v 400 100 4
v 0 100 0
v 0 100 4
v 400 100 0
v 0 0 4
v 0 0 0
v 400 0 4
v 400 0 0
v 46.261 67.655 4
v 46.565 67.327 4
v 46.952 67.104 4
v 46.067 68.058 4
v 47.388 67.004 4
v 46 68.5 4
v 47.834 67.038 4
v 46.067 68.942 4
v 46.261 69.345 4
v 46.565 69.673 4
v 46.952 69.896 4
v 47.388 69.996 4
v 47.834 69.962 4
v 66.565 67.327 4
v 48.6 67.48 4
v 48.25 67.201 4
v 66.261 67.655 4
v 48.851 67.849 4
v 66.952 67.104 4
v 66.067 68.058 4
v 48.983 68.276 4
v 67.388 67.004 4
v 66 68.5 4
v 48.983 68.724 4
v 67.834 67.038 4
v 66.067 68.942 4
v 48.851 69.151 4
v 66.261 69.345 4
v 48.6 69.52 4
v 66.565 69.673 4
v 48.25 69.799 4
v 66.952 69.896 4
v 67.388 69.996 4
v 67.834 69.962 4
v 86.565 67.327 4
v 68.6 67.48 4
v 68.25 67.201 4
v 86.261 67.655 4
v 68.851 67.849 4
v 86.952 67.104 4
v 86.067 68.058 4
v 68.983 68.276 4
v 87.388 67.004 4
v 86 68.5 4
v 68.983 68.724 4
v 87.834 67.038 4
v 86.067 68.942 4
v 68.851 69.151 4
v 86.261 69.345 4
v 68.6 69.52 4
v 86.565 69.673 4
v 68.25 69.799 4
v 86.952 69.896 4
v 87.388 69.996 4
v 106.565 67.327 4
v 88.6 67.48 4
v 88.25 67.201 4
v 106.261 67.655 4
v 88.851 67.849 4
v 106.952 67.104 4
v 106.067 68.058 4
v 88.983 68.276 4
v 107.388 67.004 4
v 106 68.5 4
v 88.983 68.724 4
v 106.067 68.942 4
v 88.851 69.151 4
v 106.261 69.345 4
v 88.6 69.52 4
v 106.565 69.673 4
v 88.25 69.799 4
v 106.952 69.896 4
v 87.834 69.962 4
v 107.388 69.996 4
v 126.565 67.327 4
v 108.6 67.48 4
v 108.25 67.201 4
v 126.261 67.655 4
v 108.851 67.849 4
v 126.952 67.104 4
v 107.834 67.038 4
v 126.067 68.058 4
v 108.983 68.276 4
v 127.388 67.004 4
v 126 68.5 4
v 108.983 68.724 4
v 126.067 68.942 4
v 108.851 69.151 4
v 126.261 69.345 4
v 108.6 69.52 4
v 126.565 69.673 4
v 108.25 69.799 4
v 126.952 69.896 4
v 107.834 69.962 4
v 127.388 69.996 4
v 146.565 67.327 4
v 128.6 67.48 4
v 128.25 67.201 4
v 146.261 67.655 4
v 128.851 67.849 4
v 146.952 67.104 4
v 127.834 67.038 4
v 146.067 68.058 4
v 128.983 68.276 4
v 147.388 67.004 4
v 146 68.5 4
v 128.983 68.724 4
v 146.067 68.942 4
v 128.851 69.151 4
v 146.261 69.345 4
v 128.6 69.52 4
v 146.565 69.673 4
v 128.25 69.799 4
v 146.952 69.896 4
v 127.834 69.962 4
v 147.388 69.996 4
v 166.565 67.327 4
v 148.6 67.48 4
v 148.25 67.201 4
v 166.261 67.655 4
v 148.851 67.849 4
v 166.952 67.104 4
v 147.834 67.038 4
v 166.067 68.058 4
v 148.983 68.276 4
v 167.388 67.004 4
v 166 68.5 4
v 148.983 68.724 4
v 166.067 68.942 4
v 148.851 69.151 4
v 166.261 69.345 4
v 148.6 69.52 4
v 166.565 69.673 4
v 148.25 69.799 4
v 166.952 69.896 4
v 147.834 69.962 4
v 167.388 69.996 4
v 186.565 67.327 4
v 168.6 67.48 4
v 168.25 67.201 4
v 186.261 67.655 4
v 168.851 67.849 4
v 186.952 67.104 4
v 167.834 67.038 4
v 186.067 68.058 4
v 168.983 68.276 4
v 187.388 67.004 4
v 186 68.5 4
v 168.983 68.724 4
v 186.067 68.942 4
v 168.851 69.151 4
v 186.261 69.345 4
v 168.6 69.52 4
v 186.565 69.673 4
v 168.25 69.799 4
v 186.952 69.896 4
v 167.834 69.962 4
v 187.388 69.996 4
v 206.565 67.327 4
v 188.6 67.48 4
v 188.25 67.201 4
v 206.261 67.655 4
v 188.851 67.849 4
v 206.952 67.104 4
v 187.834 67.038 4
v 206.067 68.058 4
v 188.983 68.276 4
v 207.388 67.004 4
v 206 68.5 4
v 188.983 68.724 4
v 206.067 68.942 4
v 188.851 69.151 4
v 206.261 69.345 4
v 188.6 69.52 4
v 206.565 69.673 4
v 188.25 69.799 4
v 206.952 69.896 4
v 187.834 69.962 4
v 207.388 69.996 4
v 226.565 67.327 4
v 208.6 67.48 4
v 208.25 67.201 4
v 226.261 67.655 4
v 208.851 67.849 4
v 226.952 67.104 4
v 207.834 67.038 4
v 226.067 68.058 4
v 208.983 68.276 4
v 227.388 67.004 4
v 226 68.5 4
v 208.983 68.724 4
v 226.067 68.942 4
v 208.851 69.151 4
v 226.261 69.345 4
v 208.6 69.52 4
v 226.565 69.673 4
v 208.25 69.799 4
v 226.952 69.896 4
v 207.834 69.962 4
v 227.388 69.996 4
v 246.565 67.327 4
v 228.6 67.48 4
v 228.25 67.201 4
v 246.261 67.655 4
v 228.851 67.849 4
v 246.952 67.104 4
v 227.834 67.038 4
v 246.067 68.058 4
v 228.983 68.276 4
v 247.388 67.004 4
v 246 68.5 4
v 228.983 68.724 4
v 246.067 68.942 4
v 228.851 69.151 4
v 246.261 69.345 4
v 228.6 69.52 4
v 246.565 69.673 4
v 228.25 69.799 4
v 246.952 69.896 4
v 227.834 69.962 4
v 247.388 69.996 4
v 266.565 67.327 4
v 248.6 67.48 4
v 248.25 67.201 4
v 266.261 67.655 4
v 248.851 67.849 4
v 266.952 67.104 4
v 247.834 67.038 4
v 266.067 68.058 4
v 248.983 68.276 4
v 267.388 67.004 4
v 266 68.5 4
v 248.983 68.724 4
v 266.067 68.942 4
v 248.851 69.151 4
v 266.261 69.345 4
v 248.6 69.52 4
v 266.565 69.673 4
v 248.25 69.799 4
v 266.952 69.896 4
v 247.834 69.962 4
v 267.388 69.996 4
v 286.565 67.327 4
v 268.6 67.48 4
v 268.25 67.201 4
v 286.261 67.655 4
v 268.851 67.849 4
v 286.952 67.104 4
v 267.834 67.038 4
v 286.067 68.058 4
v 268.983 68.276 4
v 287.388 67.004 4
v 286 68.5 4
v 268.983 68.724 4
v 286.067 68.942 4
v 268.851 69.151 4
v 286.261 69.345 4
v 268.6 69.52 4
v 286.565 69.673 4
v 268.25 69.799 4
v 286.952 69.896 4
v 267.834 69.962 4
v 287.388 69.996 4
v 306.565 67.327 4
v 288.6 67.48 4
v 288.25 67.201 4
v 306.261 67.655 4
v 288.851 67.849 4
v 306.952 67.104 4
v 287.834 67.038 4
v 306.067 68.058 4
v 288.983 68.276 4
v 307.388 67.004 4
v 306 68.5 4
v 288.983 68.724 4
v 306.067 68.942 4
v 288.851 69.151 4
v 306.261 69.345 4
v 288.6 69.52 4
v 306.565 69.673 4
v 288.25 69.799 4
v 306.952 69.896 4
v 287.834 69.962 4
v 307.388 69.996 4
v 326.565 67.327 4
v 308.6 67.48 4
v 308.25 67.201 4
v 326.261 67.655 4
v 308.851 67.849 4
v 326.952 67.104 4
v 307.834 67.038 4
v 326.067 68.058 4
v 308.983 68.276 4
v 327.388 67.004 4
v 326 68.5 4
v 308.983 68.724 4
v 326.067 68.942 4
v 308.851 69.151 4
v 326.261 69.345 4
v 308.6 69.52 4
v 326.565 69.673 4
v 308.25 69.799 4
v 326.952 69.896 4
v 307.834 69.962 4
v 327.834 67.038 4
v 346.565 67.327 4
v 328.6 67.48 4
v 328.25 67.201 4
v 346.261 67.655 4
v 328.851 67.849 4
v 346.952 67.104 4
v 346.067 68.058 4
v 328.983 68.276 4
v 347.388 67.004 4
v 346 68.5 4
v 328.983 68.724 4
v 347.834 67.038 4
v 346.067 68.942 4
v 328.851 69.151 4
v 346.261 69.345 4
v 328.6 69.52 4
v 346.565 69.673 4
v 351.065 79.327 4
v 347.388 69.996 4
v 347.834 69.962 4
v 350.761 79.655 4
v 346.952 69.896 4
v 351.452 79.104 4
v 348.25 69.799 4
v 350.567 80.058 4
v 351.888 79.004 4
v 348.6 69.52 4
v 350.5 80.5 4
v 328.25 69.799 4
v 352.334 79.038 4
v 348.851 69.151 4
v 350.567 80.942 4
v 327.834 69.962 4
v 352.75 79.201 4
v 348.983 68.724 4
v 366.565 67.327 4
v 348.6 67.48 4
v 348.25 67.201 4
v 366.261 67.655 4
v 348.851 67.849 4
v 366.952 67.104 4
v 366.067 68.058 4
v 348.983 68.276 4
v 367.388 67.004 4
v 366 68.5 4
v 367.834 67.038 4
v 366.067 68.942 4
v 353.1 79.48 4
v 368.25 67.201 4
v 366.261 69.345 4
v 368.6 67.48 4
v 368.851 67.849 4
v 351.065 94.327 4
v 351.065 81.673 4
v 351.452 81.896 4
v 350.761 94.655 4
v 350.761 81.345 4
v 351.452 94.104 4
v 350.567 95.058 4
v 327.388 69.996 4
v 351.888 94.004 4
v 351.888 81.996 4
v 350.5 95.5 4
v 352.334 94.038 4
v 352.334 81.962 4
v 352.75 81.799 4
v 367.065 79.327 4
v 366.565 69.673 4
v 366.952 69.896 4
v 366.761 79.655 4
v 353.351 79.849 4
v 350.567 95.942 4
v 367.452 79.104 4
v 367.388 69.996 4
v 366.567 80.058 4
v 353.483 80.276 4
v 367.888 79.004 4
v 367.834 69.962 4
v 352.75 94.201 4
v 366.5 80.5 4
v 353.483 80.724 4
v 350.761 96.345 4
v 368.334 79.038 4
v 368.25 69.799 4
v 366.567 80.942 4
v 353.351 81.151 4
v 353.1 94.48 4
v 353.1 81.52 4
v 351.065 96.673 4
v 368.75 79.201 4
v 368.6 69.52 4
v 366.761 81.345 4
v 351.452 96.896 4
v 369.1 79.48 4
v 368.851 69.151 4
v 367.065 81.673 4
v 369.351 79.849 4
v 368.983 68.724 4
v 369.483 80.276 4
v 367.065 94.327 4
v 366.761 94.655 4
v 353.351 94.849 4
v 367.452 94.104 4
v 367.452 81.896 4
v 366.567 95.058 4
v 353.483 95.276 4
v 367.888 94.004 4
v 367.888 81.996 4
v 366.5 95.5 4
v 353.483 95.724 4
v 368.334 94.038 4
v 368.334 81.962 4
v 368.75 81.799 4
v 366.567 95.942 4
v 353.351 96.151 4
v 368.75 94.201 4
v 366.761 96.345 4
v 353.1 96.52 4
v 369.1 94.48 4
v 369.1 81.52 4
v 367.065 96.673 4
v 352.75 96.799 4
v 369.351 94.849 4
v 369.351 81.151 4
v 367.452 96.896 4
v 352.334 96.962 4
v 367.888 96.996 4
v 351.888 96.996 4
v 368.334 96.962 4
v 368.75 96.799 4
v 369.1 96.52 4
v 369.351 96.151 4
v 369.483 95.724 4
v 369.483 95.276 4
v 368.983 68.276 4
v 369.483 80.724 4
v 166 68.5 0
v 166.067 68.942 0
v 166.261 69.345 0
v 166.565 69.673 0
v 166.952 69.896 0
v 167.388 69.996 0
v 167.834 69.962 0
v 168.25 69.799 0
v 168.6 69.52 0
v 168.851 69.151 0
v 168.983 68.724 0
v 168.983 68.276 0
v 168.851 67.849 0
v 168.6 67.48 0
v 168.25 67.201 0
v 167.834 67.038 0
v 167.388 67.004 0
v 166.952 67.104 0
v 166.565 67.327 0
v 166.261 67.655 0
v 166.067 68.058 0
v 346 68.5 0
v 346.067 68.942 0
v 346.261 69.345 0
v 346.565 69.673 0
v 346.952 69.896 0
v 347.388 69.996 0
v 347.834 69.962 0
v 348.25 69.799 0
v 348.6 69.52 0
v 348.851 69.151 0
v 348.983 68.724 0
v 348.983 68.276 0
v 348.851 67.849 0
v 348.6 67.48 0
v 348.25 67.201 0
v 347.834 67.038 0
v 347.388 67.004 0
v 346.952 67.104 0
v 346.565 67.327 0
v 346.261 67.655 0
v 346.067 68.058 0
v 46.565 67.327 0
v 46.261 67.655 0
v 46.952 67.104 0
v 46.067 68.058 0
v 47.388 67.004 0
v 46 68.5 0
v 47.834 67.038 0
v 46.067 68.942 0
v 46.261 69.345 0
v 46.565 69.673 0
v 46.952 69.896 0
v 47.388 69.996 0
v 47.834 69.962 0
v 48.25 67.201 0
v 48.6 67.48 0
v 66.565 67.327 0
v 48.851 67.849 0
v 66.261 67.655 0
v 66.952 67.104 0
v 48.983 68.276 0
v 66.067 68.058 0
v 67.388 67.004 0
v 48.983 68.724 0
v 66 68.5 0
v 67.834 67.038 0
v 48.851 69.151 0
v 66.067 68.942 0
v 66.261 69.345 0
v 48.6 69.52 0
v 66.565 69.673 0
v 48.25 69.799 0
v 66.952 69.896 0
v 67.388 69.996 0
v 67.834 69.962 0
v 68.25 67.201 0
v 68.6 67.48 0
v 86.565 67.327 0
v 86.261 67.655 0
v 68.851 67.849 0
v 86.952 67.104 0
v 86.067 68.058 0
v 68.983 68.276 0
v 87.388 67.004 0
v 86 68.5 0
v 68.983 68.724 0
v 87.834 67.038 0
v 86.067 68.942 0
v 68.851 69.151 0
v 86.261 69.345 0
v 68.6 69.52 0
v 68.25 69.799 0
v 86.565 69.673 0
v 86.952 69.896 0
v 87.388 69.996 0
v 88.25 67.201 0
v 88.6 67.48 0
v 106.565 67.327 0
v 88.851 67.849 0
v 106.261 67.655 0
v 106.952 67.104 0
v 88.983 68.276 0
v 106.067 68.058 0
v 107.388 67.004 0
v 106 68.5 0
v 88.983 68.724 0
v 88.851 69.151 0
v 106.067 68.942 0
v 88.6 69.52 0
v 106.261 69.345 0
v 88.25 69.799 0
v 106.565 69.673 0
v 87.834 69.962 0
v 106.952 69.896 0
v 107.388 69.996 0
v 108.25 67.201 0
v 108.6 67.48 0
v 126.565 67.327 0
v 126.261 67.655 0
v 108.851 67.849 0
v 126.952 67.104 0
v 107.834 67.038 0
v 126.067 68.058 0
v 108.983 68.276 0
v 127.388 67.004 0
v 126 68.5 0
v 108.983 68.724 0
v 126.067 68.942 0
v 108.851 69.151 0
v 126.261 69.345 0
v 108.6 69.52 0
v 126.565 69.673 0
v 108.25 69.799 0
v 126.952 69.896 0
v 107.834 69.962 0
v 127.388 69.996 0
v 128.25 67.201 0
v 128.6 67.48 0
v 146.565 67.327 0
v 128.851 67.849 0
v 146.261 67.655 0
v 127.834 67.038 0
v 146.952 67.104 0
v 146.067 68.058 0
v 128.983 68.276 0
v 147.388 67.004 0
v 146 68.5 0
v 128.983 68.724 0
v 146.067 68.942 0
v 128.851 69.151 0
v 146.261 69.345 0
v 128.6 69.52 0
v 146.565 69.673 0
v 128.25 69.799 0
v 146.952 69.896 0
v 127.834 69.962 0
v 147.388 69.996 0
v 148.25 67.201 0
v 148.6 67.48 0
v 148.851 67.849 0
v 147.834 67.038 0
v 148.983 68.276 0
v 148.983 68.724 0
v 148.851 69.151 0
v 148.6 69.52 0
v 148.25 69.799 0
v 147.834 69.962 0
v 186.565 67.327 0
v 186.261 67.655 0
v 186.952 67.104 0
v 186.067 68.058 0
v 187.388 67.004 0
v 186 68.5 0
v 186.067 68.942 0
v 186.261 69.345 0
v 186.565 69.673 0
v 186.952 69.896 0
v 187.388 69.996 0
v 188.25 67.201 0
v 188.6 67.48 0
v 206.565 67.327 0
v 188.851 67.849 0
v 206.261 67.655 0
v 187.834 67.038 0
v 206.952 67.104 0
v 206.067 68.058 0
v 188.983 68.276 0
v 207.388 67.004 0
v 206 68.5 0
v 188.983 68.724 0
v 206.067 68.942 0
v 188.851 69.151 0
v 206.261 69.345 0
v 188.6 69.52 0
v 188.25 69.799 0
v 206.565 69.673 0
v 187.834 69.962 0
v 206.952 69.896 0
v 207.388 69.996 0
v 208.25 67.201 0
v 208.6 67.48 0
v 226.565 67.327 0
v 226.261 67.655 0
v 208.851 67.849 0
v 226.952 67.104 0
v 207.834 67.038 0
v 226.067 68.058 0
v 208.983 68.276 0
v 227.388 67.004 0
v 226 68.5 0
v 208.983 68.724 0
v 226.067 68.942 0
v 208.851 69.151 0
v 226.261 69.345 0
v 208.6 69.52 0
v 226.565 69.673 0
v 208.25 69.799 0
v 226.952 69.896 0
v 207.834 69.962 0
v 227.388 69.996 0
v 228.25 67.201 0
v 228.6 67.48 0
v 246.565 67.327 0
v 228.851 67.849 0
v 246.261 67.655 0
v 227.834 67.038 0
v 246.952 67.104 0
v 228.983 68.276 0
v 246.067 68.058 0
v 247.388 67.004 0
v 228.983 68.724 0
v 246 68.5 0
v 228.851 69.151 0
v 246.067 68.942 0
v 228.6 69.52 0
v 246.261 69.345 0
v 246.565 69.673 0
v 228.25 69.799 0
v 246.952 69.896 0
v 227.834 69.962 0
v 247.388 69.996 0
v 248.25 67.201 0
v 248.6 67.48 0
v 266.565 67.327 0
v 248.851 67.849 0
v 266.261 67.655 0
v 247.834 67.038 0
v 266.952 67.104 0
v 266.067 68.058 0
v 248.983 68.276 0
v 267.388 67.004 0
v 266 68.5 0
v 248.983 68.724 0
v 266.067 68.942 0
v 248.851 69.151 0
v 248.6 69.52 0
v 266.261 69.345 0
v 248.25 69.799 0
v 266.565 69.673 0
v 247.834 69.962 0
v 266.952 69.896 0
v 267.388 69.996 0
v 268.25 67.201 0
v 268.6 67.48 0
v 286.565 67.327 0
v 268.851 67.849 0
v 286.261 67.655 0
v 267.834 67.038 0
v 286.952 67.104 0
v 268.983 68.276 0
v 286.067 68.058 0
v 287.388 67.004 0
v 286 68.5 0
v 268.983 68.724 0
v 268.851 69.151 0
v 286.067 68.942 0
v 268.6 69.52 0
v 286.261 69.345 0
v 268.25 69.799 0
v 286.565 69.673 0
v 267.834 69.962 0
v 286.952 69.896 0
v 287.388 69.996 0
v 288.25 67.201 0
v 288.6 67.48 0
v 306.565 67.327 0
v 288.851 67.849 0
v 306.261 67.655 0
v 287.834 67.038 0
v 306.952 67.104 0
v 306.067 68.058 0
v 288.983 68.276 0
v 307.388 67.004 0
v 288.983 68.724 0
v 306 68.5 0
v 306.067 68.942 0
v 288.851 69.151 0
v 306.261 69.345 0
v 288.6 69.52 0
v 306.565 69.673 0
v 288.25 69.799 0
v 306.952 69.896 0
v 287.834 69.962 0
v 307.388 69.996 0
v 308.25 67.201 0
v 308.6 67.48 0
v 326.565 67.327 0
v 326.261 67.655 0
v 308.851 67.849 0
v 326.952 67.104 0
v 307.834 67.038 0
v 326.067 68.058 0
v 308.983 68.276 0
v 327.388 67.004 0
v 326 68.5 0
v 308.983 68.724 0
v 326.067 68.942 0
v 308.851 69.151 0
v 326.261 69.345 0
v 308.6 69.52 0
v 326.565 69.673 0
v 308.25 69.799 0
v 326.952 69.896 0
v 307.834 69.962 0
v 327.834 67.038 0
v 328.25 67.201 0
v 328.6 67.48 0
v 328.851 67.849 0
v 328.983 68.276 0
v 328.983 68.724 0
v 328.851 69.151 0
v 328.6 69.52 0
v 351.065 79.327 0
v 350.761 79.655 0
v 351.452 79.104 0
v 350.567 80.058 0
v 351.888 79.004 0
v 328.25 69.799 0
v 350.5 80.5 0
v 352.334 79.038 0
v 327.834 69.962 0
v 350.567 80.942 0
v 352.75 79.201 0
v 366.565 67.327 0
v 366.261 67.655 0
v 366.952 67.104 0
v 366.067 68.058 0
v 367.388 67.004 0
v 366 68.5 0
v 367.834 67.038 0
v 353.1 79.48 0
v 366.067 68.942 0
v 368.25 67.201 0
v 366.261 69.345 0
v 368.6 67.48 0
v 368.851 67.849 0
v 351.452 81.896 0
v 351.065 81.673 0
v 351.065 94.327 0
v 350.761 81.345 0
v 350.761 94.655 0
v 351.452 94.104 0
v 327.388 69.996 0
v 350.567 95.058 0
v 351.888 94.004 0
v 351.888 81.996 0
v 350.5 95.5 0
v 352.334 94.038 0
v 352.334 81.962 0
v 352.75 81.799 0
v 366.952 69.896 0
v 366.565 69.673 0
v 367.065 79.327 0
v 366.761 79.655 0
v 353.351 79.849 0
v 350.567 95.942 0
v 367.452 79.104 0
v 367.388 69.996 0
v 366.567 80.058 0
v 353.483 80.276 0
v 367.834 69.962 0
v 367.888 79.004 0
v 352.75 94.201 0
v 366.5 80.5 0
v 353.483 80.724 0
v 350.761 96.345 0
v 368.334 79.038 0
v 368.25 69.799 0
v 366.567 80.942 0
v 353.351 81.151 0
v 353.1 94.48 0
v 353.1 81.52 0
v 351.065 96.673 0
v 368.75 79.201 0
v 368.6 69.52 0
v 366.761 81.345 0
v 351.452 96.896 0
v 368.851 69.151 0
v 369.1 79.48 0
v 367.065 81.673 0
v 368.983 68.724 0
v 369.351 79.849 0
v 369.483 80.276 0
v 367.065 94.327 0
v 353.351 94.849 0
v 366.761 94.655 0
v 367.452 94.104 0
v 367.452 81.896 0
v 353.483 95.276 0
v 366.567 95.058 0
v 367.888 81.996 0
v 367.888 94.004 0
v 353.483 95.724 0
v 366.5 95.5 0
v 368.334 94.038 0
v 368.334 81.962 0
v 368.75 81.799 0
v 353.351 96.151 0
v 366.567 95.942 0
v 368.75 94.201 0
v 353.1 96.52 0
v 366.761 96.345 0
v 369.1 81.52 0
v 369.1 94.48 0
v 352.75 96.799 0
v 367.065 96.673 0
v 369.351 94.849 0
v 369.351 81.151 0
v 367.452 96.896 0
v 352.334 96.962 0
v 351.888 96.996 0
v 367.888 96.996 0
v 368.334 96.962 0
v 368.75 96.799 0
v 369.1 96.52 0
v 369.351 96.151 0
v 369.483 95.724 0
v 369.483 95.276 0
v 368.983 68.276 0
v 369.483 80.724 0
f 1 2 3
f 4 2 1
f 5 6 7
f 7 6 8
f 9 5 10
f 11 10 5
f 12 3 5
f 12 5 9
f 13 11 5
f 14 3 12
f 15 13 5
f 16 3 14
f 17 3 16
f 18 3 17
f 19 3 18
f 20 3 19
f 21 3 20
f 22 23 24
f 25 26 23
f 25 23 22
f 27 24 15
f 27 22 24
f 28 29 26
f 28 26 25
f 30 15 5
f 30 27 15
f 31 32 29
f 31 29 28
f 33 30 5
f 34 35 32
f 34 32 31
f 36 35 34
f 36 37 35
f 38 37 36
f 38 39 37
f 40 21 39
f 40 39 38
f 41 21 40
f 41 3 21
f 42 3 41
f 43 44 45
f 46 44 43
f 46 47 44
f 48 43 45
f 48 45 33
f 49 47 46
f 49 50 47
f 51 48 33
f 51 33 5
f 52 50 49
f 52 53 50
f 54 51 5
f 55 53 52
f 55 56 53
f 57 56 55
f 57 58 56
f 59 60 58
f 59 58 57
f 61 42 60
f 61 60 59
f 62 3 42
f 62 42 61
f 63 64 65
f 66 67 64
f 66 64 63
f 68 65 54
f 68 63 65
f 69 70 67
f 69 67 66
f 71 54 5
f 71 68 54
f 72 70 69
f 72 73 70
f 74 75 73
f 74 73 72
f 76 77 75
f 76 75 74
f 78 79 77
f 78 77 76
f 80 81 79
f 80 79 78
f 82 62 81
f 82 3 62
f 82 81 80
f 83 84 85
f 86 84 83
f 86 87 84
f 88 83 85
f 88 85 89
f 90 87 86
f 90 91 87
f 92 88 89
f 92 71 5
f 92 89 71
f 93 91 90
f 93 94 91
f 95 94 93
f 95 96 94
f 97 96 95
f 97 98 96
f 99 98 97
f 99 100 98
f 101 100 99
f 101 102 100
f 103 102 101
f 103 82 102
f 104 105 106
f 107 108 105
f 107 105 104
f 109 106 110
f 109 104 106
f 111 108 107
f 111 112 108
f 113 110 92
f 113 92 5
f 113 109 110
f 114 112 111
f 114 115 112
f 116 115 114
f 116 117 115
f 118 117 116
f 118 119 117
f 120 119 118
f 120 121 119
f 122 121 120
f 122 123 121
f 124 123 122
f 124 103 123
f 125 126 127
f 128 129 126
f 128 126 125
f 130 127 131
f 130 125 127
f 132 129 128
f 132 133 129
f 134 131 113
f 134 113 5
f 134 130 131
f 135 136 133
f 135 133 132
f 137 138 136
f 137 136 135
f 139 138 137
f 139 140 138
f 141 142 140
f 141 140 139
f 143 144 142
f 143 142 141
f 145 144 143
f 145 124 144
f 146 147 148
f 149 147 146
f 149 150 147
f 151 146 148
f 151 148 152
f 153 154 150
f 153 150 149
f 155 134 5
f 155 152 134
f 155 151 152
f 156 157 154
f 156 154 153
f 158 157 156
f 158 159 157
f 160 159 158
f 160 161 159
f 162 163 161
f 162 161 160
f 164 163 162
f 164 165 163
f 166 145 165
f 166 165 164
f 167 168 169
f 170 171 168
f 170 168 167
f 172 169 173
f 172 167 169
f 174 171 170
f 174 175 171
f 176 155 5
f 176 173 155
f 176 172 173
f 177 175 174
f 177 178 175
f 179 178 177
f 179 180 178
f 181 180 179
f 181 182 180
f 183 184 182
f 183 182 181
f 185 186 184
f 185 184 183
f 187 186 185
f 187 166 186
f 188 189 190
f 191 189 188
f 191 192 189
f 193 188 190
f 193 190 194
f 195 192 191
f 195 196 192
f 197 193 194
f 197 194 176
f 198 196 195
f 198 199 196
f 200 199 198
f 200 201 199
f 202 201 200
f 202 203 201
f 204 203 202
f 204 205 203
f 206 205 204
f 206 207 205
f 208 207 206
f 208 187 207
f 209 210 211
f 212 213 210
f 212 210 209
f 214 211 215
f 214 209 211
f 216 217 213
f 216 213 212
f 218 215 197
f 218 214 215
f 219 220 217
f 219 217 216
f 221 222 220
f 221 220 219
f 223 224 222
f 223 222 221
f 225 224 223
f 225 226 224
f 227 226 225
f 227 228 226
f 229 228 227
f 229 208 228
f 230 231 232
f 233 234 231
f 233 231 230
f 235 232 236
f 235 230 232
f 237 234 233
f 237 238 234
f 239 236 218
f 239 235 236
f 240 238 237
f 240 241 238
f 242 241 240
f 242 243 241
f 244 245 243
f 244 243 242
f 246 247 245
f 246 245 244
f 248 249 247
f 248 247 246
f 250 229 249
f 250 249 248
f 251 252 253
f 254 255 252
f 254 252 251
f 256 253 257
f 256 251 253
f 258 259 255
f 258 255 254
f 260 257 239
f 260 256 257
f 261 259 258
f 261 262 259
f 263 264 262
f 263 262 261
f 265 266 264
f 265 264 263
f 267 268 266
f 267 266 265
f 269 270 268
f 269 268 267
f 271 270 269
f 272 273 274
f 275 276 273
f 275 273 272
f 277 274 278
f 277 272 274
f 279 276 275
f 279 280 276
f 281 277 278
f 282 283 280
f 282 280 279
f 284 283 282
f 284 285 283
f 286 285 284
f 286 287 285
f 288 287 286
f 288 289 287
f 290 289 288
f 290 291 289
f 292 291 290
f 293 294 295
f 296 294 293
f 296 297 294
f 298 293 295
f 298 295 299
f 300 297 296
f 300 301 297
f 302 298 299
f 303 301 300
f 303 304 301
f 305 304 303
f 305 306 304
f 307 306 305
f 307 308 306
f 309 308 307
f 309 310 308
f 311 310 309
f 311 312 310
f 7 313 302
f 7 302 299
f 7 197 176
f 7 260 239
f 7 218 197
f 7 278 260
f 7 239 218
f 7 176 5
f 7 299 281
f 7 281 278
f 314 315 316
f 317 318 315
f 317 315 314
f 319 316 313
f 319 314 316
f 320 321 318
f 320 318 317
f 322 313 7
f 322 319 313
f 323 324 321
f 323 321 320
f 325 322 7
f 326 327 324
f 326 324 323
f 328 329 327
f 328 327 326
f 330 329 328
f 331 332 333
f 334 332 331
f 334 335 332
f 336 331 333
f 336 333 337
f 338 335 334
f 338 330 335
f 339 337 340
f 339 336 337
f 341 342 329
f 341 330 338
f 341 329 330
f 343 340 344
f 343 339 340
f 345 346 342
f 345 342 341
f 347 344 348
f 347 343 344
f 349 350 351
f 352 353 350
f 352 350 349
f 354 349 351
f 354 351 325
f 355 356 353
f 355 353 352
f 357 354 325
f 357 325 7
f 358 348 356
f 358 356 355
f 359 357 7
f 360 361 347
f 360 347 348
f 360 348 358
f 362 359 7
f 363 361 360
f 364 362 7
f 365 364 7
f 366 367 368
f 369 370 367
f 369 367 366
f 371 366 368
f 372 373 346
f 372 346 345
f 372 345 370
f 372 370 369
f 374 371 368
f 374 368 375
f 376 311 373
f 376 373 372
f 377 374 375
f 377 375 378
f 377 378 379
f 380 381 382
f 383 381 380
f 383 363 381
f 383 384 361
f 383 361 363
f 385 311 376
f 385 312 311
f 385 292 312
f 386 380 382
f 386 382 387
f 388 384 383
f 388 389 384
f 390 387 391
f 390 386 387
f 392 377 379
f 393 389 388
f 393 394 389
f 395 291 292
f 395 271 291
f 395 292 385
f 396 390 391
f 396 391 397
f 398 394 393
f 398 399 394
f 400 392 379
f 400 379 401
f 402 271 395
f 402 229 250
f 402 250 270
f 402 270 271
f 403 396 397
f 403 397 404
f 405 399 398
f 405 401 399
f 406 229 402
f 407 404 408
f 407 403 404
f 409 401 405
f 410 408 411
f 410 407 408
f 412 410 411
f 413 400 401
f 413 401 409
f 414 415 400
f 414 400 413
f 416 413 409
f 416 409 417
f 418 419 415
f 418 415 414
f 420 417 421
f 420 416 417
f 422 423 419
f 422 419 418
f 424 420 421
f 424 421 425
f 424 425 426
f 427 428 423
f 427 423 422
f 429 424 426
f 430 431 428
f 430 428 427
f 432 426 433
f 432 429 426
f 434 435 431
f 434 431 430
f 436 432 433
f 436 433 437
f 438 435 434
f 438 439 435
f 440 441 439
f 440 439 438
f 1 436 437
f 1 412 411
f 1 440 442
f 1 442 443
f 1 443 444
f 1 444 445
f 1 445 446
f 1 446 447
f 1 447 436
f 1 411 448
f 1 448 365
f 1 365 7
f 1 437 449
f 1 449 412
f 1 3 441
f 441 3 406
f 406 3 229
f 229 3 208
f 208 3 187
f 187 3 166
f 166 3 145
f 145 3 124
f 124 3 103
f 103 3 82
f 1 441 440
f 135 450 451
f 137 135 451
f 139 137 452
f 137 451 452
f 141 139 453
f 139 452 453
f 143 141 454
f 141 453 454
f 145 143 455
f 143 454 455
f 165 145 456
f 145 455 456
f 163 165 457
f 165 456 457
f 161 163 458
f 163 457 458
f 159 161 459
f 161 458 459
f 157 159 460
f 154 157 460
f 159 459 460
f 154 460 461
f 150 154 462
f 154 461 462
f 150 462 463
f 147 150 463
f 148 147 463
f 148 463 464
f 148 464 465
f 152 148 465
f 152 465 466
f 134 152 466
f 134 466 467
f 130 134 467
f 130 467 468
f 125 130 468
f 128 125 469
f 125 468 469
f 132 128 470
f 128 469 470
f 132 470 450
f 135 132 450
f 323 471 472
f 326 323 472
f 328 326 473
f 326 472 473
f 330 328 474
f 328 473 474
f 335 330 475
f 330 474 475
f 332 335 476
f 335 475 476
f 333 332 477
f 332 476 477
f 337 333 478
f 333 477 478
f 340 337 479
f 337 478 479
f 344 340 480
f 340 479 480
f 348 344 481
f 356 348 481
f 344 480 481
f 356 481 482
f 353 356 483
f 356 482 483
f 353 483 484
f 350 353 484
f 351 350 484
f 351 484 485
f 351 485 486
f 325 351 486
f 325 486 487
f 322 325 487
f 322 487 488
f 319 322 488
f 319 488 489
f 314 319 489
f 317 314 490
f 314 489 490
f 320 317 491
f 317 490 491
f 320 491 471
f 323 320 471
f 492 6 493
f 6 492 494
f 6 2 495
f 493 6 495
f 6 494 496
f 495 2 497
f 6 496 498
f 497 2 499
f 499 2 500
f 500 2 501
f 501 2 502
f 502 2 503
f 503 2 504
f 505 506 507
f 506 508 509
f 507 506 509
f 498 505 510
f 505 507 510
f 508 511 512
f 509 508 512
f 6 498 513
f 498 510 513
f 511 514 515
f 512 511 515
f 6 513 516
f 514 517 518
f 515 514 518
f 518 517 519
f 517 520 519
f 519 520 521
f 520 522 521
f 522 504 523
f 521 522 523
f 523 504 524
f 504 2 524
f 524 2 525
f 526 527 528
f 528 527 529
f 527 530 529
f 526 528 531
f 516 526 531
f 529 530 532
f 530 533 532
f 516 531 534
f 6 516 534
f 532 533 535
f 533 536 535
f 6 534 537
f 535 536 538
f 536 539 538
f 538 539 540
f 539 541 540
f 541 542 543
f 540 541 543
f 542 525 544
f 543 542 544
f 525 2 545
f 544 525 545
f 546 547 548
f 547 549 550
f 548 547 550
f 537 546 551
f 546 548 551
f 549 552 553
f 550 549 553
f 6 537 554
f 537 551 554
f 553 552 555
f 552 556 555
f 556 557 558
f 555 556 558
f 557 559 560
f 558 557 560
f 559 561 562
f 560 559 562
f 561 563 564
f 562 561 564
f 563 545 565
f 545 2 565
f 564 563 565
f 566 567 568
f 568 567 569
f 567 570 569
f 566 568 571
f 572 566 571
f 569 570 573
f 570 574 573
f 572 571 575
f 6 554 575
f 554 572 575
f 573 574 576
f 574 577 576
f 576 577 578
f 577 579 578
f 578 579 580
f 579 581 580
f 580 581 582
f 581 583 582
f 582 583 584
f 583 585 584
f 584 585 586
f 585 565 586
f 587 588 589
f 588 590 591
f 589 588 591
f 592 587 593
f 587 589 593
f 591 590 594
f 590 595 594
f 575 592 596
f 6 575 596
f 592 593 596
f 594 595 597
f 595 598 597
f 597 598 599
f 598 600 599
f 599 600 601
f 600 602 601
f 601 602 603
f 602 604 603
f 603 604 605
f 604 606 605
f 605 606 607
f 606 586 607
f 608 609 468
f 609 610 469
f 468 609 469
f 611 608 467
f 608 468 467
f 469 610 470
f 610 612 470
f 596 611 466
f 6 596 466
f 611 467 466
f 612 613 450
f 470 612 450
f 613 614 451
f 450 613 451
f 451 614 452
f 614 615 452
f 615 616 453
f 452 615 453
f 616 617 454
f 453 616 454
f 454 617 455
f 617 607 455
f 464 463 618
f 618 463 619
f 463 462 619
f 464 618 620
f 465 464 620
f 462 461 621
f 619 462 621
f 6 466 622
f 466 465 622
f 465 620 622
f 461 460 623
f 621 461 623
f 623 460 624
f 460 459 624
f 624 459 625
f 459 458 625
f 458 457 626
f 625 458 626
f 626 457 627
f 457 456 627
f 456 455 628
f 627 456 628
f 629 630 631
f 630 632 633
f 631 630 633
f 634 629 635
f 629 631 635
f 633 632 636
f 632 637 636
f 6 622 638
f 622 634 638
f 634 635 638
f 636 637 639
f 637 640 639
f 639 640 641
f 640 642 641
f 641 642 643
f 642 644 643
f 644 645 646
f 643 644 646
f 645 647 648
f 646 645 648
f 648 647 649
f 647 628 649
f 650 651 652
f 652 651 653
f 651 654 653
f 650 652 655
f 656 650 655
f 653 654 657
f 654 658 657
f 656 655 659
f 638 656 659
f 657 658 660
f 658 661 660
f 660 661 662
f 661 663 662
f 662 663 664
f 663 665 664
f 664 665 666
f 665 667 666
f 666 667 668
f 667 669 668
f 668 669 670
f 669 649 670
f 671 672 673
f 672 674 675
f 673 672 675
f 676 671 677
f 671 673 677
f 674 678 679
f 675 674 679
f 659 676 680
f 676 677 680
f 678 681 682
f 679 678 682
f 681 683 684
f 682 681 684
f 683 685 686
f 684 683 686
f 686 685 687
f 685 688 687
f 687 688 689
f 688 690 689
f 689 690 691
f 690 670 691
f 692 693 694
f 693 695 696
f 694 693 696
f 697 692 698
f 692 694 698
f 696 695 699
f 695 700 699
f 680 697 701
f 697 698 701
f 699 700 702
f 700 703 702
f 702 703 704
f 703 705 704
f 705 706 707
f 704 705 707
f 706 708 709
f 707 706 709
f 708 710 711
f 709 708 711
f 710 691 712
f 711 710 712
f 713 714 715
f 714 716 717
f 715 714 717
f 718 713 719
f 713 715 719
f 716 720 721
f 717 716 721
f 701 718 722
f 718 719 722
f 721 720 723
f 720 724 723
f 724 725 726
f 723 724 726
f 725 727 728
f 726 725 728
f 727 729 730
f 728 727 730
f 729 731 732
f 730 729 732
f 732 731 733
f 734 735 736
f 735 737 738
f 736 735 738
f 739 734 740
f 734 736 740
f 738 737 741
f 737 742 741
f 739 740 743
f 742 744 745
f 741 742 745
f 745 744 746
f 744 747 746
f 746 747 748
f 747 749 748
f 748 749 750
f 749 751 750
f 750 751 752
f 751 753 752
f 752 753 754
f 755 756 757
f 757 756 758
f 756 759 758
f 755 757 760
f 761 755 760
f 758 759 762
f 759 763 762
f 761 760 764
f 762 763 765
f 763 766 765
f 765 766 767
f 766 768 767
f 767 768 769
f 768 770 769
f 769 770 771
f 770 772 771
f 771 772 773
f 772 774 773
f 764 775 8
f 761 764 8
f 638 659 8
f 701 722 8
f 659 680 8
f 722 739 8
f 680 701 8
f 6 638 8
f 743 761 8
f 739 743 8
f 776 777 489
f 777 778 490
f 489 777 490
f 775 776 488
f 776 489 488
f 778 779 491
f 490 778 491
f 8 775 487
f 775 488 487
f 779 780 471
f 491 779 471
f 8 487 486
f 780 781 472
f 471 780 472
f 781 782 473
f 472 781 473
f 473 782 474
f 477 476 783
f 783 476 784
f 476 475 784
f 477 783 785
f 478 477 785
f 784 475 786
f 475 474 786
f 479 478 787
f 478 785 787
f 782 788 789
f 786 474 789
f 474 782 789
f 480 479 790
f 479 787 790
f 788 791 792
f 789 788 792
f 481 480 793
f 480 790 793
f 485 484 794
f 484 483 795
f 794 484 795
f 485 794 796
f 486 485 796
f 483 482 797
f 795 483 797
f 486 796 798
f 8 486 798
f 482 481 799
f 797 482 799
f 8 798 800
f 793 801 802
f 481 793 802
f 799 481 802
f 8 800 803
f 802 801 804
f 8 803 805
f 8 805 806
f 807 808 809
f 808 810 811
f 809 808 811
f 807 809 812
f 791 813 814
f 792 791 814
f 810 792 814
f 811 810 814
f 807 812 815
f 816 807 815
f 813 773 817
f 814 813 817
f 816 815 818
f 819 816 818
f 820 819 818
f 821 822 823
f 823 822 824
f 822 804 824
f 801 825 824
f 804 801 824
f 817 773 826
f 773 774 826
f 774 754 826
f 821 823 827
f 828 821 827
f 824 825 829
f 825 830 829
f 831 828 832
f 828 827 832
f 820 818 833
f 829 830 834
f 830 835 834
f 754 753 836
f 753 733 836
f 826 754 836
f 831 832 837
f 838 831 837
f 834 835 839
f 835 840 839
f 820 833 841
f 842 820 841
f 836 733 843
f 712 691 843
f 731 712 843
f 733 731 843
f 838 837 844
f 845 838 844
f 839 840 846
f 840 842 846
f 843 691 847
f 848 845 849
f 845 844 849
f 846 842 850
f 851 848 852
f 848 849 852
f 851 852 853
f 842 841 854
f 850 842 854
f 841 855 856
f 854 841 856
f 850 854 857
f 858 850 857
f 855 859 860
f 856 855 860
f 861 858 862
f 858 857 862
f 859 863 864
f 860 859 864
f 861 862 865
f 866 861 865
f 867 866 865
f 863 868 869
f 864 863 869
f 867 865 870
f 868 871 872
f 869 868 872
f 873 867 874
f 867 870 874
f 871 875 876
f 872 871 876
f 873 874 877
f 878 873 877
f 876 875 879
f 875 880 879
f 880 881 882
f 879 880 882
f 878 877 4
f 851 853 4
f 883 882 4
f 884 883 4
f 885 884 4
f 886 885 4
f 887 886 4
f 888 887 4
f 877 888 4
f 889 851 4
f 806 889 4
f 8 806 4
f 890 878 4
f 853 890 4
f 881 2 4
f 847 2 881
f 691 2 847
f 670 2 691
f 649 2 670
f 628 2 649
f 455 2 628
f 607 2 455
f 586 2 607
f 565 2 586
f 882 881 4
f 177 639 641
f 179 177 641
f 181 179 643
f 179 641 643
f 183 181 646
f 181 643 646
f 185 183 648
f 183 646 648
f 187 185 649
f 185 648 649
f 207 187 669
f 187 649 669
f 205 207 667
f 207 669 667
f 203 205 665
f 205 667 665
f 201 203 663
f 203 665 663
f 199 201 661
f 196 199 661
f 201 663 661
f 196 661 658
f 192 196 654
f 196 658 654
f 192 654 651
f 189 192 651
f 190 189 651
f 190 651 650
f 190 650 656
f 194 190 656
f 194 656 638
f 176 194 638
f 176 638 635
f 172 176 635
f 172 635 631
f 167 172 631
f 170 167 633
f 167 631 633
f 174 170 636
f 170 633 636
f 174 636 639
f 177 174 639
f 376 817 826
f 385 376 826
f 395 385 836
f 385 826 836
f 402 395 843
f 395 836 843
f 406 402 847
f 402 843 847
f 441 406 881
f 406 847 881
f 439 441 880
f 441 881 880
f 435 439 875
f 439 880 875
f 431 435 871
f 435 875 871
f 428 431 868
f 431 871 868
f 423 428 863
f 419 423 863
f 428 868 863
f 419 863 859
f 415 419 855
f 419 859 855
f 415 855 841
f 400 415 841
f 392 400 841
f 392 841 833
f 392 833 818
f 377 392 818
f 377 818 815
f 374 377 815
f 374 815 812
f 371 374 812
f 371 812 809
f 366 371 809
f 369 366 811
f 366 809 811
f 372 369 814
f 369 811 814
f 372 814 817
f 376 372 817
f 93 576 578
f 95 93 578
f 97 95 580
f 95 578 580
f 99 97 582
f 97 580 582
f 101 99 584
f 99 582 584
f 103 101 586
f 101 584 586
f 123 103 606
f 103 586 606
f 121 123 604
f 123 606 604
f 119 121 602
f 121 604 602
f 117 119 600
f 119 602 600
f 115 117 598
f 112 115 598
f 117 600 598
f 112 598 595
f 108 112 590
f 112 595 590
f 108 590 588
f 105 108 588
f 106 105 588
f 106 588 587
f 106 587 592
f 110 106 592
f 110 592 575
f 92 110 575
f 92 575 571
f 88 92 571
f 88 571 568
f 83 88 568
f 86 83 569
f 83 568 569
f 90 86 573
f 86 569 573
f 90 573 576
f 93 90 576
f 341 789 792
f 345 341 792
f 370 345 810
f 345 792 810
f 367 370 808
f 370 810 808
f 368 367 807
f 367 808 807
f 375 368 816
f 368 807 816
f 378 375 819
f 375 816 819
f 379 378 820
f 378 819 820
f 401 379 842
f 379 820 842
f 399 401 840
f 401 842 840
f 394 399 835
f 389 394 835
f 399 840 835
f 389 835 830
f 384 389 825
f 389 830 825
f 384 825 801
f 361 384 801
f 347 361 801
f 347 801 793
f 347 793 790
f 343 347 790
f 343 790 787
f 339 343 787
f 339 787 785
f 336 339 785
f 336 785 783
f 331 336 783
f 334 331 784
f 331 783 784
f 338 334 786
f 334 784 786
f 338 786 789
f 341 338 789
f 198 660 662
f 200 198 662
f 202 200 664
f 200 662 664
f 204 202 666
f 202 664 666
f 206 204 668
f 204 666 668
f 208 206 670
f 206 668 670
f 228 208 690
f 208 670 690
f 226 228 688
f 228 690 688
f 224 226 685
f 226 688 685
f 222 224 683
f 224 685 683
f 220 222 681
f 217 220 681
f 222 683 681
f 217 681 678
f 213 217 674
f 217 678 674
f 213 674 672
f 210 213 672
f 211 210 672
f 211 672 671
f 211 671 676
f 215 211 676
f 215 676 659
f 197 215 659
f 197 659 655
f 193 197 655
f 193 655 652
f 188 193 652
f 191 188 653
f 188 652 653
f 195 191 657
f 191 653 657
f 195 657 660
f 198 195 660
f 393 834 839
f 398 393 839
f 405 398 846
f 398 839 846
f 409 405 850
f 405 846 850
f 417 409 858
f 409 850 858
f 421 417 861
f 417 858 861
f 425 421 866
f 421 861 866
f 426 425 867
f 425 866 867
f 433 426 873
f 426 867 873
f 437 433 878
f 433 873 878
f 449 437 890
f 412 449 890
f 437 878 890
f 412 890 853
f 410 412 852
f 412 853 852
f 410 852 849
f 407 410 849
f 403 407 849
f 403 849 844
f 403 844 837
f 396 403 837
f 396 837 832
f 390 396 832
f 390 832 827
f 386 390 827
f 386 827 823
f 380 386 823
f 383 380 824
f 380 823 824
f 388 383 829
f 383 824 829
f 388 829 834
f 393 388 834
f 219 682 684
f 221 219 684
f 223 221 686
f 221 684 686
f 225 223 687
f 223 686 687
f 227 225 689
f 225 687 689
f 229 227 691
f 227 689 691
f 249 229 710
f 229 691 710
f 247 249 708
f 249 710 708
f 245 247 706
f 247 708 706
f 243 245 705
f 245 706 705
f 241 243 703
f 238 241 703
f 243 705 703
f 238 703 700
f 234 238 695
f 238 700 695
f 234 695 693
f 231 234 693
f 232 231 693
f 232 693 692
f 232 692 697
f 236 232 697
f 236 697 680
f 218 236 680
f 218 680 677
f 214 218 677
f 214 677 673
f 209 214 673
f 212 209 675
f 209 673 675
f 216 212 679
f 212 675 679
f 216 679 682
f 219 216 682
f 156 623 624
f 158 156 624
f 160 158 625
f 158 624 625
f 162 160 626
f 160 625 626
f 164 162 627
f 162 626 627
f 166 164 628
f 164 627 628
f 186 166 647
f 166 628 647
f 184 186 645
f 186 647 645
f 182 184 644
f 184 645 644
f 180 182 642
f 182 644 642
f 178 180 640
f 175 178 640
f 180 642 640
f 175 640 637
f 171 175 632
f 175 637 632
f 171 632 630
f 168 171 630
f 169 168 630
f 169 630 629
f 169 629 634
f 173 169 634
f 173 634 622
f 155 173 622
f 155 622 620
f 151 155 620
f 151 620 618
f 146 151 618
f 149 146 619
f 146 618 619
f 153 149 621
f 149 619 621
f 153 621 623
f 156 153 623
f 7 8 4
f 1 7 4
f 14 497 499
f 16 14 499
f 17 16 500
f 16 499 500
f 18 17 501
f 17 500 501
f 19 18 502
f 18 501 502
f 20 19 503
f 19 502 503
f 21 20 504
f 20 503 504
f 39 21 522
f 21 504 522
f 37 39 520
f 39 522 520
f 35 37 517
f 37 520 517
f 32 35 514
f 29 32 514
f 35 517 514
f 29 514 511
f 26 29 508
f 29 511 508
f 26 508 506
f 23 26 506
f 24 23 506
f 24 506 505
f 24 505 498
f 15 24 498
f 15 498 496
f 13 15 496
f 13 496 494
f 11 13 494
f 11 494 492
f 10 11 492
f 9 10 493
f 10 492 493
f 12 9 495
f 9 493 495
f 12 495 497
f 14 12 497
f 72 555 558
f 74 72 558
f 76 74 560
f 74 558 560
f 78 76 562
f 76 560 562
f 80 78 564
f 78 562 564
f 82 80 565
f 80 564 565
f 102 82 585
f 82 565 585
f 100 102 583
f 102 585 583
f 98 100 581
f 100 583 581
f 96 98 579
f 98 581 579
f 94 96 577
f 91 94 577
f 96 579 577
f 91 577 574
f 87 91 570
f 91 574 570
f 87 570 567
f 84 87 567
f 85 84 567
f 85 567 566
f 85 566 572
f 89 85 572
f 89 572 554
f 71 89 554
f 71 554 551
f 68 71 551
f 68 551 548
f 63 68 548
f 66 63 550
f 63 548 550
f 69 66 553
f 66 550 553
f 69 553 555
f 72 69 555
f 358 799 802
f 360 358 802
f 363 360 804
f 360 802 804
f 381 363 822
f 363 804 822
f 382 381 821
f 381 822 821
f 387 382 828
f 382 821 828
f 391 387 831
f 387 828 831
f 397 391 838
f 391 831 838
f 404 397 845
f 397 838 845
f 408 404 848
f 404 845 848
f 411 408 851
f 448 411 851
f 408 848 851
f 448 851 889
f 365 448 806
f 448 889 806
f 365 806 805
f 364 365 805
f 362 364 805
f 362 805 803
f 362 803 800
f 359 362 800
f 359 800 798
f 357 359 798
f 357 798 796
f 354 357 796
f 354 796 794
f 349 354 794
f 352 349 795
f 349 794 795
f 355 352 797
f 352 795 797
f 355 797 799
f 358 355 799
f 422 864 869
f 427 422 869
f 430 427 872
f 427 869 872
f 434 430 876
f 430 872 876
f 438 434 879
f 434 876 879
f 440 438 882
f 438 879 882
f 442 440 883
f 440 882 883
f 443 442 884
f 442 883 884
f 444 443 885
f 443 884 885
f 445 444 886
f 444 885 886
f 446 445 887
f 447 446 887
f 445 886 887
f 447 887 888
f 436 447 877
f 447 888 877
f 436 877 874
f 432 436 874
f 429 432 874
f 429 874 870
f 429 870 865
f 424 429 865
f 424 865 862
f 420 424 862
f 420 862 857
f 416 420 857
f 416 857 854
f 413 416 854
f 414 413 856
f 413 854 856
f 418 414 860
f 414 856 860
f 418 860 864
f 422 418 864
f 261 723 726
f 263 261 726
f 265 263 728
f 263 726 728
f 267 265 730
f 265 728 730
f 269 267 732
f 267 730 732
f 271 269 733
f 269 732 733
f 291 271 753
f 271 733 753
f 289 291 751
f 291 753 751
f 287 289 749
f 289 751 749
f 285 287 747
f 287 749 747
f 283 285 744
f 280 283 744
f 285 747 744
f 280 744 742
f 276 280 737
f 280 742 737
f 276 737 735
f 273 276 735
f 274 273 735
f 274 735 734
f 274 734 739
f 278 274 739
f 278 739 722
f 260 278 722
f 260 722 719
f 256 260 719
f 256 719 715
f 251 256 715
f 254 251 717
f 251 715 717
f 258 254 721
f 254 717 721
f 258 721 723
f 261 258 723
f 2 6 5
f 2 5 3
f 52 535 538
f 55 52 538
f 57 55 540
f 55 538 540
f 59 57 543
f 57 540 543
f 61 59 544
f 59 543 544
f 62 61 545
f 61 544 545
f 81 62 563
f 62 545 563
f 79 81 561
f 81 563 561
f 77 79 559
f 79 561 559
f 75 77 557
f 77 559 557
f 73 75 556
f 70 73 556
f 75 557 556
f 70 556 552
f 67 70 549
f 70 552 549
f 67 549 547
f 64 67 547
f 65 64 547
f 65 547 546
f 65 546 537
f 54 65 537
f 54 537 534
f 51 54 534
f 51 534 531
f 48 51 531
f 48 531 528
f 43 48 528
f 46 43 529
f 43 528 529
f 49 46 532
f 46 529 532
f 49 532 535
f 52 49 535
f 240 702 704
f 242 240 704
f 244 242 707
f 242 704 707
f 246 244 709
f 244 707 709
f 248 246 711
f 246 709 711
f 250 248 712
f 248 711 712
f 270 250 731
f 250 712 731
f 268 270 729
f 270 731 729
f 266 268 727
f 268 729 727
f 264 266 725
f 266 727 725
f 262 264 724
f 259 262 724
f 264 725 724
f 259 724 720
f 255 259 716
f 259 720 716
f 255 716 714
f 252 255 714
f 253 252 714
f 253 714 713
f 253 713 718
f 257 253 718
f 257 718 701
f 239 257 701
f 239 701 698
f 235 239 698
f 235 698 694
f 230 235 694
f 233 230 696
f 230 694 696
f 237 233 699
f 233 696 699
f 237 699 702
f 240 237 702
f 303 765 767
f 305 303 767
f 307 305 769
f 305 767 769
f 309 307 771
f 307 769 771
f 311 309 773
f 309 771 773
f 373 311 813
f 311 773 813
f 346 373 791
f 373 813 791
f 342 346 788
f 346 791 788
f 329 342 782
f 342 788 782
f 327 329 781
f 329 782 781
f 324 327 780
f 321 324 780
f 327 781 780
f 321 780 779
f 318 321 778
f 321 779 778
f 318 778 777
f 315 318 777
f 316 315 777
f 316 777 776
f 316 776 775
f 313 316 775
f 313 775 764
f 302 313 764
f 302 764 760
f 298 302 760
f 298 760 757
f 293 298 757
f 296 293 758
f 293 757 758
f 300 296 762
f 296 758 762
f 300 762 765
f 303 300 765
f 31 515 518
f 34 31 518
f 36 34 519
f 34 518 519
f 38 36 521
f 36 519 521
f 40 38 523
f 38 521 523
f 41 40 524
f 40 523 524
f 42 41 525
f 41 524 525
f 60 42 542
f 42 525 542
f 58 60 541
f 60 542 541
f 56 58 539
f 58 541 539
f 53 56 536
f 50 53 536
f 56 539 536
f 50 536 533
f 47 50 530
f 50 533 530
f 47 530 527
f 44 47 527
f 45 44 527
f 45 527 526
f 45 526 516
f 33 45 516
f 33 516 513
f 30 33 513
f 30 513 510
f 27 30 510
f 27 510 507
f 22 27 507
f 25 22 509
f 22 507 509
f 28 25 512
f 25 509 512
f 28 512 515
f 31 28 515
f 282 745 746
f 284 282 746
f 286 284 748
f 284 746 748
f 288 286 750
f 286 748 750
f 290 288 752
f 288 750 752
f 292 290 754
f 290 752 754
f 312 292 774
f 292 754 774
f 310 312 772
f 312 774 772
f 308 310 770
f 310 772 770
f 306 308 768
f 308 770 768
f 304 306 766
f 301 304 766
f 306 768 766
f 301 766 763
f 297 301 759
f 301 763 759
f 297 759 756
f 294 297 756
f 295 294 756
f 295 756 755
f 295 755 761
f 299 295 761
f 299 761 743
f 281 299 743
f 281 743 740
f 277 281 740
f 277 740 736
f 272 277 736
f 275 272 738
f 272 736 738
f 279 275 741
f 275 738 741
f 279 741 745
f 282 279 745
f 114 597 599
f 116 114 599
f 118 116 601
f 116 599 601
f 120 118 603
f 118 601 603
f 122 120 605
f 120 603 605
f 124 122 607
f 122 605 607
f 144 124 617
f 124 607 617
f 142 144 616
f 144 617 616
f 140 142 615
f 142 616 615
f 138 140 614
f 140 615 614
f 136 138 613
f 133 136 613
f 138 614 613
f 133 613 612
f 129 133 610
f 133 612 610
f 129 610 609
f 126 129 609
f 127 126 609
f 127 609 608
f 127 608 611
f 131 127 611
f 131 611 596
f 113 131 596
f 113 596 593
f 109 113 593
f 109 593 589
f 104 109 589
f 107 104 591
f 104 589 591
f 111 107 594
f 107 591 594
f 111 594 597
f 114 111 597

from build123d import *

# Parameters (mm, degrees)
SKETCH_1_W             = 400
SKETCH_1_H             = 100
EXTRUDE_1_DEPTH        = 4
SKETCH_2_R             = 1.5
CUT_EXTRUDE_1_DEPTH    = 4
SKETCH_3_R             = 1.5
CUT_EXTRUDE_2_DEPTH    = 4
PATTERN_LINEAR_1_COUNT = 17
PATTERN_LINEAR_1_PITCH = 20


with BuildPart() as part:
    # 草图1 → 凸台-拉伸1 (new body)
    with BuildSketch(Plane.XY):
        with Locations((200, 50)):
            Rectangle(SKETCH_1_W, SKETCH_1_H)
    extrude(amount=EXTRUDE_1_DEPTH)

    # 草图2 → 切除-拉伸1 (cut)
    with BuildSketch(Plane(origin=(0, 0, 0), x_dir=(-1, 0, 0), z_dir=(0, 0, -1))):
        with Locations((-368, 95.5)):
            Circle(SKETCH_2_R)
        with Locations((-352, 95.5)):
            Circle(SKETCH_2_R)
        with Locations((-368, 80.5)):
            Circle(SKETCH_2_R)
        with Locations((-352, 80.5)):
            Circle(SKETCH_2_R)
    extrude(amount=-CUT_EXTRUDE_1_DEPTH, mode=Mode.SUBTRACT)

    # 草图3 → 切除-拉伸2 (cut)
    with BuildSketch(Plane(origin=(0, 0, 0), x_dir=(-1, 0, 0), z_dir=(0, 0, -1))):
        with Locations((-367.5, 68.5)):
            Circle(SKETCH_3_R)
    cut_extrude_2 = extrude(amount=-CUT_EXTRUDE_2_DEPTH, mode=Mode.SUBTRACT)

    # 阵列(线性)1: 切除-拉伸2 ×17
    with Locations(*[(-i * PATTERN_LINEAR_1_PITCH, 0, 0) for i in range(1, PATTERN_LINEAR_1_COUNT)]):
        add(cut_extrude_2, mode=Mode.SUBTRACT)


solid = part.part
